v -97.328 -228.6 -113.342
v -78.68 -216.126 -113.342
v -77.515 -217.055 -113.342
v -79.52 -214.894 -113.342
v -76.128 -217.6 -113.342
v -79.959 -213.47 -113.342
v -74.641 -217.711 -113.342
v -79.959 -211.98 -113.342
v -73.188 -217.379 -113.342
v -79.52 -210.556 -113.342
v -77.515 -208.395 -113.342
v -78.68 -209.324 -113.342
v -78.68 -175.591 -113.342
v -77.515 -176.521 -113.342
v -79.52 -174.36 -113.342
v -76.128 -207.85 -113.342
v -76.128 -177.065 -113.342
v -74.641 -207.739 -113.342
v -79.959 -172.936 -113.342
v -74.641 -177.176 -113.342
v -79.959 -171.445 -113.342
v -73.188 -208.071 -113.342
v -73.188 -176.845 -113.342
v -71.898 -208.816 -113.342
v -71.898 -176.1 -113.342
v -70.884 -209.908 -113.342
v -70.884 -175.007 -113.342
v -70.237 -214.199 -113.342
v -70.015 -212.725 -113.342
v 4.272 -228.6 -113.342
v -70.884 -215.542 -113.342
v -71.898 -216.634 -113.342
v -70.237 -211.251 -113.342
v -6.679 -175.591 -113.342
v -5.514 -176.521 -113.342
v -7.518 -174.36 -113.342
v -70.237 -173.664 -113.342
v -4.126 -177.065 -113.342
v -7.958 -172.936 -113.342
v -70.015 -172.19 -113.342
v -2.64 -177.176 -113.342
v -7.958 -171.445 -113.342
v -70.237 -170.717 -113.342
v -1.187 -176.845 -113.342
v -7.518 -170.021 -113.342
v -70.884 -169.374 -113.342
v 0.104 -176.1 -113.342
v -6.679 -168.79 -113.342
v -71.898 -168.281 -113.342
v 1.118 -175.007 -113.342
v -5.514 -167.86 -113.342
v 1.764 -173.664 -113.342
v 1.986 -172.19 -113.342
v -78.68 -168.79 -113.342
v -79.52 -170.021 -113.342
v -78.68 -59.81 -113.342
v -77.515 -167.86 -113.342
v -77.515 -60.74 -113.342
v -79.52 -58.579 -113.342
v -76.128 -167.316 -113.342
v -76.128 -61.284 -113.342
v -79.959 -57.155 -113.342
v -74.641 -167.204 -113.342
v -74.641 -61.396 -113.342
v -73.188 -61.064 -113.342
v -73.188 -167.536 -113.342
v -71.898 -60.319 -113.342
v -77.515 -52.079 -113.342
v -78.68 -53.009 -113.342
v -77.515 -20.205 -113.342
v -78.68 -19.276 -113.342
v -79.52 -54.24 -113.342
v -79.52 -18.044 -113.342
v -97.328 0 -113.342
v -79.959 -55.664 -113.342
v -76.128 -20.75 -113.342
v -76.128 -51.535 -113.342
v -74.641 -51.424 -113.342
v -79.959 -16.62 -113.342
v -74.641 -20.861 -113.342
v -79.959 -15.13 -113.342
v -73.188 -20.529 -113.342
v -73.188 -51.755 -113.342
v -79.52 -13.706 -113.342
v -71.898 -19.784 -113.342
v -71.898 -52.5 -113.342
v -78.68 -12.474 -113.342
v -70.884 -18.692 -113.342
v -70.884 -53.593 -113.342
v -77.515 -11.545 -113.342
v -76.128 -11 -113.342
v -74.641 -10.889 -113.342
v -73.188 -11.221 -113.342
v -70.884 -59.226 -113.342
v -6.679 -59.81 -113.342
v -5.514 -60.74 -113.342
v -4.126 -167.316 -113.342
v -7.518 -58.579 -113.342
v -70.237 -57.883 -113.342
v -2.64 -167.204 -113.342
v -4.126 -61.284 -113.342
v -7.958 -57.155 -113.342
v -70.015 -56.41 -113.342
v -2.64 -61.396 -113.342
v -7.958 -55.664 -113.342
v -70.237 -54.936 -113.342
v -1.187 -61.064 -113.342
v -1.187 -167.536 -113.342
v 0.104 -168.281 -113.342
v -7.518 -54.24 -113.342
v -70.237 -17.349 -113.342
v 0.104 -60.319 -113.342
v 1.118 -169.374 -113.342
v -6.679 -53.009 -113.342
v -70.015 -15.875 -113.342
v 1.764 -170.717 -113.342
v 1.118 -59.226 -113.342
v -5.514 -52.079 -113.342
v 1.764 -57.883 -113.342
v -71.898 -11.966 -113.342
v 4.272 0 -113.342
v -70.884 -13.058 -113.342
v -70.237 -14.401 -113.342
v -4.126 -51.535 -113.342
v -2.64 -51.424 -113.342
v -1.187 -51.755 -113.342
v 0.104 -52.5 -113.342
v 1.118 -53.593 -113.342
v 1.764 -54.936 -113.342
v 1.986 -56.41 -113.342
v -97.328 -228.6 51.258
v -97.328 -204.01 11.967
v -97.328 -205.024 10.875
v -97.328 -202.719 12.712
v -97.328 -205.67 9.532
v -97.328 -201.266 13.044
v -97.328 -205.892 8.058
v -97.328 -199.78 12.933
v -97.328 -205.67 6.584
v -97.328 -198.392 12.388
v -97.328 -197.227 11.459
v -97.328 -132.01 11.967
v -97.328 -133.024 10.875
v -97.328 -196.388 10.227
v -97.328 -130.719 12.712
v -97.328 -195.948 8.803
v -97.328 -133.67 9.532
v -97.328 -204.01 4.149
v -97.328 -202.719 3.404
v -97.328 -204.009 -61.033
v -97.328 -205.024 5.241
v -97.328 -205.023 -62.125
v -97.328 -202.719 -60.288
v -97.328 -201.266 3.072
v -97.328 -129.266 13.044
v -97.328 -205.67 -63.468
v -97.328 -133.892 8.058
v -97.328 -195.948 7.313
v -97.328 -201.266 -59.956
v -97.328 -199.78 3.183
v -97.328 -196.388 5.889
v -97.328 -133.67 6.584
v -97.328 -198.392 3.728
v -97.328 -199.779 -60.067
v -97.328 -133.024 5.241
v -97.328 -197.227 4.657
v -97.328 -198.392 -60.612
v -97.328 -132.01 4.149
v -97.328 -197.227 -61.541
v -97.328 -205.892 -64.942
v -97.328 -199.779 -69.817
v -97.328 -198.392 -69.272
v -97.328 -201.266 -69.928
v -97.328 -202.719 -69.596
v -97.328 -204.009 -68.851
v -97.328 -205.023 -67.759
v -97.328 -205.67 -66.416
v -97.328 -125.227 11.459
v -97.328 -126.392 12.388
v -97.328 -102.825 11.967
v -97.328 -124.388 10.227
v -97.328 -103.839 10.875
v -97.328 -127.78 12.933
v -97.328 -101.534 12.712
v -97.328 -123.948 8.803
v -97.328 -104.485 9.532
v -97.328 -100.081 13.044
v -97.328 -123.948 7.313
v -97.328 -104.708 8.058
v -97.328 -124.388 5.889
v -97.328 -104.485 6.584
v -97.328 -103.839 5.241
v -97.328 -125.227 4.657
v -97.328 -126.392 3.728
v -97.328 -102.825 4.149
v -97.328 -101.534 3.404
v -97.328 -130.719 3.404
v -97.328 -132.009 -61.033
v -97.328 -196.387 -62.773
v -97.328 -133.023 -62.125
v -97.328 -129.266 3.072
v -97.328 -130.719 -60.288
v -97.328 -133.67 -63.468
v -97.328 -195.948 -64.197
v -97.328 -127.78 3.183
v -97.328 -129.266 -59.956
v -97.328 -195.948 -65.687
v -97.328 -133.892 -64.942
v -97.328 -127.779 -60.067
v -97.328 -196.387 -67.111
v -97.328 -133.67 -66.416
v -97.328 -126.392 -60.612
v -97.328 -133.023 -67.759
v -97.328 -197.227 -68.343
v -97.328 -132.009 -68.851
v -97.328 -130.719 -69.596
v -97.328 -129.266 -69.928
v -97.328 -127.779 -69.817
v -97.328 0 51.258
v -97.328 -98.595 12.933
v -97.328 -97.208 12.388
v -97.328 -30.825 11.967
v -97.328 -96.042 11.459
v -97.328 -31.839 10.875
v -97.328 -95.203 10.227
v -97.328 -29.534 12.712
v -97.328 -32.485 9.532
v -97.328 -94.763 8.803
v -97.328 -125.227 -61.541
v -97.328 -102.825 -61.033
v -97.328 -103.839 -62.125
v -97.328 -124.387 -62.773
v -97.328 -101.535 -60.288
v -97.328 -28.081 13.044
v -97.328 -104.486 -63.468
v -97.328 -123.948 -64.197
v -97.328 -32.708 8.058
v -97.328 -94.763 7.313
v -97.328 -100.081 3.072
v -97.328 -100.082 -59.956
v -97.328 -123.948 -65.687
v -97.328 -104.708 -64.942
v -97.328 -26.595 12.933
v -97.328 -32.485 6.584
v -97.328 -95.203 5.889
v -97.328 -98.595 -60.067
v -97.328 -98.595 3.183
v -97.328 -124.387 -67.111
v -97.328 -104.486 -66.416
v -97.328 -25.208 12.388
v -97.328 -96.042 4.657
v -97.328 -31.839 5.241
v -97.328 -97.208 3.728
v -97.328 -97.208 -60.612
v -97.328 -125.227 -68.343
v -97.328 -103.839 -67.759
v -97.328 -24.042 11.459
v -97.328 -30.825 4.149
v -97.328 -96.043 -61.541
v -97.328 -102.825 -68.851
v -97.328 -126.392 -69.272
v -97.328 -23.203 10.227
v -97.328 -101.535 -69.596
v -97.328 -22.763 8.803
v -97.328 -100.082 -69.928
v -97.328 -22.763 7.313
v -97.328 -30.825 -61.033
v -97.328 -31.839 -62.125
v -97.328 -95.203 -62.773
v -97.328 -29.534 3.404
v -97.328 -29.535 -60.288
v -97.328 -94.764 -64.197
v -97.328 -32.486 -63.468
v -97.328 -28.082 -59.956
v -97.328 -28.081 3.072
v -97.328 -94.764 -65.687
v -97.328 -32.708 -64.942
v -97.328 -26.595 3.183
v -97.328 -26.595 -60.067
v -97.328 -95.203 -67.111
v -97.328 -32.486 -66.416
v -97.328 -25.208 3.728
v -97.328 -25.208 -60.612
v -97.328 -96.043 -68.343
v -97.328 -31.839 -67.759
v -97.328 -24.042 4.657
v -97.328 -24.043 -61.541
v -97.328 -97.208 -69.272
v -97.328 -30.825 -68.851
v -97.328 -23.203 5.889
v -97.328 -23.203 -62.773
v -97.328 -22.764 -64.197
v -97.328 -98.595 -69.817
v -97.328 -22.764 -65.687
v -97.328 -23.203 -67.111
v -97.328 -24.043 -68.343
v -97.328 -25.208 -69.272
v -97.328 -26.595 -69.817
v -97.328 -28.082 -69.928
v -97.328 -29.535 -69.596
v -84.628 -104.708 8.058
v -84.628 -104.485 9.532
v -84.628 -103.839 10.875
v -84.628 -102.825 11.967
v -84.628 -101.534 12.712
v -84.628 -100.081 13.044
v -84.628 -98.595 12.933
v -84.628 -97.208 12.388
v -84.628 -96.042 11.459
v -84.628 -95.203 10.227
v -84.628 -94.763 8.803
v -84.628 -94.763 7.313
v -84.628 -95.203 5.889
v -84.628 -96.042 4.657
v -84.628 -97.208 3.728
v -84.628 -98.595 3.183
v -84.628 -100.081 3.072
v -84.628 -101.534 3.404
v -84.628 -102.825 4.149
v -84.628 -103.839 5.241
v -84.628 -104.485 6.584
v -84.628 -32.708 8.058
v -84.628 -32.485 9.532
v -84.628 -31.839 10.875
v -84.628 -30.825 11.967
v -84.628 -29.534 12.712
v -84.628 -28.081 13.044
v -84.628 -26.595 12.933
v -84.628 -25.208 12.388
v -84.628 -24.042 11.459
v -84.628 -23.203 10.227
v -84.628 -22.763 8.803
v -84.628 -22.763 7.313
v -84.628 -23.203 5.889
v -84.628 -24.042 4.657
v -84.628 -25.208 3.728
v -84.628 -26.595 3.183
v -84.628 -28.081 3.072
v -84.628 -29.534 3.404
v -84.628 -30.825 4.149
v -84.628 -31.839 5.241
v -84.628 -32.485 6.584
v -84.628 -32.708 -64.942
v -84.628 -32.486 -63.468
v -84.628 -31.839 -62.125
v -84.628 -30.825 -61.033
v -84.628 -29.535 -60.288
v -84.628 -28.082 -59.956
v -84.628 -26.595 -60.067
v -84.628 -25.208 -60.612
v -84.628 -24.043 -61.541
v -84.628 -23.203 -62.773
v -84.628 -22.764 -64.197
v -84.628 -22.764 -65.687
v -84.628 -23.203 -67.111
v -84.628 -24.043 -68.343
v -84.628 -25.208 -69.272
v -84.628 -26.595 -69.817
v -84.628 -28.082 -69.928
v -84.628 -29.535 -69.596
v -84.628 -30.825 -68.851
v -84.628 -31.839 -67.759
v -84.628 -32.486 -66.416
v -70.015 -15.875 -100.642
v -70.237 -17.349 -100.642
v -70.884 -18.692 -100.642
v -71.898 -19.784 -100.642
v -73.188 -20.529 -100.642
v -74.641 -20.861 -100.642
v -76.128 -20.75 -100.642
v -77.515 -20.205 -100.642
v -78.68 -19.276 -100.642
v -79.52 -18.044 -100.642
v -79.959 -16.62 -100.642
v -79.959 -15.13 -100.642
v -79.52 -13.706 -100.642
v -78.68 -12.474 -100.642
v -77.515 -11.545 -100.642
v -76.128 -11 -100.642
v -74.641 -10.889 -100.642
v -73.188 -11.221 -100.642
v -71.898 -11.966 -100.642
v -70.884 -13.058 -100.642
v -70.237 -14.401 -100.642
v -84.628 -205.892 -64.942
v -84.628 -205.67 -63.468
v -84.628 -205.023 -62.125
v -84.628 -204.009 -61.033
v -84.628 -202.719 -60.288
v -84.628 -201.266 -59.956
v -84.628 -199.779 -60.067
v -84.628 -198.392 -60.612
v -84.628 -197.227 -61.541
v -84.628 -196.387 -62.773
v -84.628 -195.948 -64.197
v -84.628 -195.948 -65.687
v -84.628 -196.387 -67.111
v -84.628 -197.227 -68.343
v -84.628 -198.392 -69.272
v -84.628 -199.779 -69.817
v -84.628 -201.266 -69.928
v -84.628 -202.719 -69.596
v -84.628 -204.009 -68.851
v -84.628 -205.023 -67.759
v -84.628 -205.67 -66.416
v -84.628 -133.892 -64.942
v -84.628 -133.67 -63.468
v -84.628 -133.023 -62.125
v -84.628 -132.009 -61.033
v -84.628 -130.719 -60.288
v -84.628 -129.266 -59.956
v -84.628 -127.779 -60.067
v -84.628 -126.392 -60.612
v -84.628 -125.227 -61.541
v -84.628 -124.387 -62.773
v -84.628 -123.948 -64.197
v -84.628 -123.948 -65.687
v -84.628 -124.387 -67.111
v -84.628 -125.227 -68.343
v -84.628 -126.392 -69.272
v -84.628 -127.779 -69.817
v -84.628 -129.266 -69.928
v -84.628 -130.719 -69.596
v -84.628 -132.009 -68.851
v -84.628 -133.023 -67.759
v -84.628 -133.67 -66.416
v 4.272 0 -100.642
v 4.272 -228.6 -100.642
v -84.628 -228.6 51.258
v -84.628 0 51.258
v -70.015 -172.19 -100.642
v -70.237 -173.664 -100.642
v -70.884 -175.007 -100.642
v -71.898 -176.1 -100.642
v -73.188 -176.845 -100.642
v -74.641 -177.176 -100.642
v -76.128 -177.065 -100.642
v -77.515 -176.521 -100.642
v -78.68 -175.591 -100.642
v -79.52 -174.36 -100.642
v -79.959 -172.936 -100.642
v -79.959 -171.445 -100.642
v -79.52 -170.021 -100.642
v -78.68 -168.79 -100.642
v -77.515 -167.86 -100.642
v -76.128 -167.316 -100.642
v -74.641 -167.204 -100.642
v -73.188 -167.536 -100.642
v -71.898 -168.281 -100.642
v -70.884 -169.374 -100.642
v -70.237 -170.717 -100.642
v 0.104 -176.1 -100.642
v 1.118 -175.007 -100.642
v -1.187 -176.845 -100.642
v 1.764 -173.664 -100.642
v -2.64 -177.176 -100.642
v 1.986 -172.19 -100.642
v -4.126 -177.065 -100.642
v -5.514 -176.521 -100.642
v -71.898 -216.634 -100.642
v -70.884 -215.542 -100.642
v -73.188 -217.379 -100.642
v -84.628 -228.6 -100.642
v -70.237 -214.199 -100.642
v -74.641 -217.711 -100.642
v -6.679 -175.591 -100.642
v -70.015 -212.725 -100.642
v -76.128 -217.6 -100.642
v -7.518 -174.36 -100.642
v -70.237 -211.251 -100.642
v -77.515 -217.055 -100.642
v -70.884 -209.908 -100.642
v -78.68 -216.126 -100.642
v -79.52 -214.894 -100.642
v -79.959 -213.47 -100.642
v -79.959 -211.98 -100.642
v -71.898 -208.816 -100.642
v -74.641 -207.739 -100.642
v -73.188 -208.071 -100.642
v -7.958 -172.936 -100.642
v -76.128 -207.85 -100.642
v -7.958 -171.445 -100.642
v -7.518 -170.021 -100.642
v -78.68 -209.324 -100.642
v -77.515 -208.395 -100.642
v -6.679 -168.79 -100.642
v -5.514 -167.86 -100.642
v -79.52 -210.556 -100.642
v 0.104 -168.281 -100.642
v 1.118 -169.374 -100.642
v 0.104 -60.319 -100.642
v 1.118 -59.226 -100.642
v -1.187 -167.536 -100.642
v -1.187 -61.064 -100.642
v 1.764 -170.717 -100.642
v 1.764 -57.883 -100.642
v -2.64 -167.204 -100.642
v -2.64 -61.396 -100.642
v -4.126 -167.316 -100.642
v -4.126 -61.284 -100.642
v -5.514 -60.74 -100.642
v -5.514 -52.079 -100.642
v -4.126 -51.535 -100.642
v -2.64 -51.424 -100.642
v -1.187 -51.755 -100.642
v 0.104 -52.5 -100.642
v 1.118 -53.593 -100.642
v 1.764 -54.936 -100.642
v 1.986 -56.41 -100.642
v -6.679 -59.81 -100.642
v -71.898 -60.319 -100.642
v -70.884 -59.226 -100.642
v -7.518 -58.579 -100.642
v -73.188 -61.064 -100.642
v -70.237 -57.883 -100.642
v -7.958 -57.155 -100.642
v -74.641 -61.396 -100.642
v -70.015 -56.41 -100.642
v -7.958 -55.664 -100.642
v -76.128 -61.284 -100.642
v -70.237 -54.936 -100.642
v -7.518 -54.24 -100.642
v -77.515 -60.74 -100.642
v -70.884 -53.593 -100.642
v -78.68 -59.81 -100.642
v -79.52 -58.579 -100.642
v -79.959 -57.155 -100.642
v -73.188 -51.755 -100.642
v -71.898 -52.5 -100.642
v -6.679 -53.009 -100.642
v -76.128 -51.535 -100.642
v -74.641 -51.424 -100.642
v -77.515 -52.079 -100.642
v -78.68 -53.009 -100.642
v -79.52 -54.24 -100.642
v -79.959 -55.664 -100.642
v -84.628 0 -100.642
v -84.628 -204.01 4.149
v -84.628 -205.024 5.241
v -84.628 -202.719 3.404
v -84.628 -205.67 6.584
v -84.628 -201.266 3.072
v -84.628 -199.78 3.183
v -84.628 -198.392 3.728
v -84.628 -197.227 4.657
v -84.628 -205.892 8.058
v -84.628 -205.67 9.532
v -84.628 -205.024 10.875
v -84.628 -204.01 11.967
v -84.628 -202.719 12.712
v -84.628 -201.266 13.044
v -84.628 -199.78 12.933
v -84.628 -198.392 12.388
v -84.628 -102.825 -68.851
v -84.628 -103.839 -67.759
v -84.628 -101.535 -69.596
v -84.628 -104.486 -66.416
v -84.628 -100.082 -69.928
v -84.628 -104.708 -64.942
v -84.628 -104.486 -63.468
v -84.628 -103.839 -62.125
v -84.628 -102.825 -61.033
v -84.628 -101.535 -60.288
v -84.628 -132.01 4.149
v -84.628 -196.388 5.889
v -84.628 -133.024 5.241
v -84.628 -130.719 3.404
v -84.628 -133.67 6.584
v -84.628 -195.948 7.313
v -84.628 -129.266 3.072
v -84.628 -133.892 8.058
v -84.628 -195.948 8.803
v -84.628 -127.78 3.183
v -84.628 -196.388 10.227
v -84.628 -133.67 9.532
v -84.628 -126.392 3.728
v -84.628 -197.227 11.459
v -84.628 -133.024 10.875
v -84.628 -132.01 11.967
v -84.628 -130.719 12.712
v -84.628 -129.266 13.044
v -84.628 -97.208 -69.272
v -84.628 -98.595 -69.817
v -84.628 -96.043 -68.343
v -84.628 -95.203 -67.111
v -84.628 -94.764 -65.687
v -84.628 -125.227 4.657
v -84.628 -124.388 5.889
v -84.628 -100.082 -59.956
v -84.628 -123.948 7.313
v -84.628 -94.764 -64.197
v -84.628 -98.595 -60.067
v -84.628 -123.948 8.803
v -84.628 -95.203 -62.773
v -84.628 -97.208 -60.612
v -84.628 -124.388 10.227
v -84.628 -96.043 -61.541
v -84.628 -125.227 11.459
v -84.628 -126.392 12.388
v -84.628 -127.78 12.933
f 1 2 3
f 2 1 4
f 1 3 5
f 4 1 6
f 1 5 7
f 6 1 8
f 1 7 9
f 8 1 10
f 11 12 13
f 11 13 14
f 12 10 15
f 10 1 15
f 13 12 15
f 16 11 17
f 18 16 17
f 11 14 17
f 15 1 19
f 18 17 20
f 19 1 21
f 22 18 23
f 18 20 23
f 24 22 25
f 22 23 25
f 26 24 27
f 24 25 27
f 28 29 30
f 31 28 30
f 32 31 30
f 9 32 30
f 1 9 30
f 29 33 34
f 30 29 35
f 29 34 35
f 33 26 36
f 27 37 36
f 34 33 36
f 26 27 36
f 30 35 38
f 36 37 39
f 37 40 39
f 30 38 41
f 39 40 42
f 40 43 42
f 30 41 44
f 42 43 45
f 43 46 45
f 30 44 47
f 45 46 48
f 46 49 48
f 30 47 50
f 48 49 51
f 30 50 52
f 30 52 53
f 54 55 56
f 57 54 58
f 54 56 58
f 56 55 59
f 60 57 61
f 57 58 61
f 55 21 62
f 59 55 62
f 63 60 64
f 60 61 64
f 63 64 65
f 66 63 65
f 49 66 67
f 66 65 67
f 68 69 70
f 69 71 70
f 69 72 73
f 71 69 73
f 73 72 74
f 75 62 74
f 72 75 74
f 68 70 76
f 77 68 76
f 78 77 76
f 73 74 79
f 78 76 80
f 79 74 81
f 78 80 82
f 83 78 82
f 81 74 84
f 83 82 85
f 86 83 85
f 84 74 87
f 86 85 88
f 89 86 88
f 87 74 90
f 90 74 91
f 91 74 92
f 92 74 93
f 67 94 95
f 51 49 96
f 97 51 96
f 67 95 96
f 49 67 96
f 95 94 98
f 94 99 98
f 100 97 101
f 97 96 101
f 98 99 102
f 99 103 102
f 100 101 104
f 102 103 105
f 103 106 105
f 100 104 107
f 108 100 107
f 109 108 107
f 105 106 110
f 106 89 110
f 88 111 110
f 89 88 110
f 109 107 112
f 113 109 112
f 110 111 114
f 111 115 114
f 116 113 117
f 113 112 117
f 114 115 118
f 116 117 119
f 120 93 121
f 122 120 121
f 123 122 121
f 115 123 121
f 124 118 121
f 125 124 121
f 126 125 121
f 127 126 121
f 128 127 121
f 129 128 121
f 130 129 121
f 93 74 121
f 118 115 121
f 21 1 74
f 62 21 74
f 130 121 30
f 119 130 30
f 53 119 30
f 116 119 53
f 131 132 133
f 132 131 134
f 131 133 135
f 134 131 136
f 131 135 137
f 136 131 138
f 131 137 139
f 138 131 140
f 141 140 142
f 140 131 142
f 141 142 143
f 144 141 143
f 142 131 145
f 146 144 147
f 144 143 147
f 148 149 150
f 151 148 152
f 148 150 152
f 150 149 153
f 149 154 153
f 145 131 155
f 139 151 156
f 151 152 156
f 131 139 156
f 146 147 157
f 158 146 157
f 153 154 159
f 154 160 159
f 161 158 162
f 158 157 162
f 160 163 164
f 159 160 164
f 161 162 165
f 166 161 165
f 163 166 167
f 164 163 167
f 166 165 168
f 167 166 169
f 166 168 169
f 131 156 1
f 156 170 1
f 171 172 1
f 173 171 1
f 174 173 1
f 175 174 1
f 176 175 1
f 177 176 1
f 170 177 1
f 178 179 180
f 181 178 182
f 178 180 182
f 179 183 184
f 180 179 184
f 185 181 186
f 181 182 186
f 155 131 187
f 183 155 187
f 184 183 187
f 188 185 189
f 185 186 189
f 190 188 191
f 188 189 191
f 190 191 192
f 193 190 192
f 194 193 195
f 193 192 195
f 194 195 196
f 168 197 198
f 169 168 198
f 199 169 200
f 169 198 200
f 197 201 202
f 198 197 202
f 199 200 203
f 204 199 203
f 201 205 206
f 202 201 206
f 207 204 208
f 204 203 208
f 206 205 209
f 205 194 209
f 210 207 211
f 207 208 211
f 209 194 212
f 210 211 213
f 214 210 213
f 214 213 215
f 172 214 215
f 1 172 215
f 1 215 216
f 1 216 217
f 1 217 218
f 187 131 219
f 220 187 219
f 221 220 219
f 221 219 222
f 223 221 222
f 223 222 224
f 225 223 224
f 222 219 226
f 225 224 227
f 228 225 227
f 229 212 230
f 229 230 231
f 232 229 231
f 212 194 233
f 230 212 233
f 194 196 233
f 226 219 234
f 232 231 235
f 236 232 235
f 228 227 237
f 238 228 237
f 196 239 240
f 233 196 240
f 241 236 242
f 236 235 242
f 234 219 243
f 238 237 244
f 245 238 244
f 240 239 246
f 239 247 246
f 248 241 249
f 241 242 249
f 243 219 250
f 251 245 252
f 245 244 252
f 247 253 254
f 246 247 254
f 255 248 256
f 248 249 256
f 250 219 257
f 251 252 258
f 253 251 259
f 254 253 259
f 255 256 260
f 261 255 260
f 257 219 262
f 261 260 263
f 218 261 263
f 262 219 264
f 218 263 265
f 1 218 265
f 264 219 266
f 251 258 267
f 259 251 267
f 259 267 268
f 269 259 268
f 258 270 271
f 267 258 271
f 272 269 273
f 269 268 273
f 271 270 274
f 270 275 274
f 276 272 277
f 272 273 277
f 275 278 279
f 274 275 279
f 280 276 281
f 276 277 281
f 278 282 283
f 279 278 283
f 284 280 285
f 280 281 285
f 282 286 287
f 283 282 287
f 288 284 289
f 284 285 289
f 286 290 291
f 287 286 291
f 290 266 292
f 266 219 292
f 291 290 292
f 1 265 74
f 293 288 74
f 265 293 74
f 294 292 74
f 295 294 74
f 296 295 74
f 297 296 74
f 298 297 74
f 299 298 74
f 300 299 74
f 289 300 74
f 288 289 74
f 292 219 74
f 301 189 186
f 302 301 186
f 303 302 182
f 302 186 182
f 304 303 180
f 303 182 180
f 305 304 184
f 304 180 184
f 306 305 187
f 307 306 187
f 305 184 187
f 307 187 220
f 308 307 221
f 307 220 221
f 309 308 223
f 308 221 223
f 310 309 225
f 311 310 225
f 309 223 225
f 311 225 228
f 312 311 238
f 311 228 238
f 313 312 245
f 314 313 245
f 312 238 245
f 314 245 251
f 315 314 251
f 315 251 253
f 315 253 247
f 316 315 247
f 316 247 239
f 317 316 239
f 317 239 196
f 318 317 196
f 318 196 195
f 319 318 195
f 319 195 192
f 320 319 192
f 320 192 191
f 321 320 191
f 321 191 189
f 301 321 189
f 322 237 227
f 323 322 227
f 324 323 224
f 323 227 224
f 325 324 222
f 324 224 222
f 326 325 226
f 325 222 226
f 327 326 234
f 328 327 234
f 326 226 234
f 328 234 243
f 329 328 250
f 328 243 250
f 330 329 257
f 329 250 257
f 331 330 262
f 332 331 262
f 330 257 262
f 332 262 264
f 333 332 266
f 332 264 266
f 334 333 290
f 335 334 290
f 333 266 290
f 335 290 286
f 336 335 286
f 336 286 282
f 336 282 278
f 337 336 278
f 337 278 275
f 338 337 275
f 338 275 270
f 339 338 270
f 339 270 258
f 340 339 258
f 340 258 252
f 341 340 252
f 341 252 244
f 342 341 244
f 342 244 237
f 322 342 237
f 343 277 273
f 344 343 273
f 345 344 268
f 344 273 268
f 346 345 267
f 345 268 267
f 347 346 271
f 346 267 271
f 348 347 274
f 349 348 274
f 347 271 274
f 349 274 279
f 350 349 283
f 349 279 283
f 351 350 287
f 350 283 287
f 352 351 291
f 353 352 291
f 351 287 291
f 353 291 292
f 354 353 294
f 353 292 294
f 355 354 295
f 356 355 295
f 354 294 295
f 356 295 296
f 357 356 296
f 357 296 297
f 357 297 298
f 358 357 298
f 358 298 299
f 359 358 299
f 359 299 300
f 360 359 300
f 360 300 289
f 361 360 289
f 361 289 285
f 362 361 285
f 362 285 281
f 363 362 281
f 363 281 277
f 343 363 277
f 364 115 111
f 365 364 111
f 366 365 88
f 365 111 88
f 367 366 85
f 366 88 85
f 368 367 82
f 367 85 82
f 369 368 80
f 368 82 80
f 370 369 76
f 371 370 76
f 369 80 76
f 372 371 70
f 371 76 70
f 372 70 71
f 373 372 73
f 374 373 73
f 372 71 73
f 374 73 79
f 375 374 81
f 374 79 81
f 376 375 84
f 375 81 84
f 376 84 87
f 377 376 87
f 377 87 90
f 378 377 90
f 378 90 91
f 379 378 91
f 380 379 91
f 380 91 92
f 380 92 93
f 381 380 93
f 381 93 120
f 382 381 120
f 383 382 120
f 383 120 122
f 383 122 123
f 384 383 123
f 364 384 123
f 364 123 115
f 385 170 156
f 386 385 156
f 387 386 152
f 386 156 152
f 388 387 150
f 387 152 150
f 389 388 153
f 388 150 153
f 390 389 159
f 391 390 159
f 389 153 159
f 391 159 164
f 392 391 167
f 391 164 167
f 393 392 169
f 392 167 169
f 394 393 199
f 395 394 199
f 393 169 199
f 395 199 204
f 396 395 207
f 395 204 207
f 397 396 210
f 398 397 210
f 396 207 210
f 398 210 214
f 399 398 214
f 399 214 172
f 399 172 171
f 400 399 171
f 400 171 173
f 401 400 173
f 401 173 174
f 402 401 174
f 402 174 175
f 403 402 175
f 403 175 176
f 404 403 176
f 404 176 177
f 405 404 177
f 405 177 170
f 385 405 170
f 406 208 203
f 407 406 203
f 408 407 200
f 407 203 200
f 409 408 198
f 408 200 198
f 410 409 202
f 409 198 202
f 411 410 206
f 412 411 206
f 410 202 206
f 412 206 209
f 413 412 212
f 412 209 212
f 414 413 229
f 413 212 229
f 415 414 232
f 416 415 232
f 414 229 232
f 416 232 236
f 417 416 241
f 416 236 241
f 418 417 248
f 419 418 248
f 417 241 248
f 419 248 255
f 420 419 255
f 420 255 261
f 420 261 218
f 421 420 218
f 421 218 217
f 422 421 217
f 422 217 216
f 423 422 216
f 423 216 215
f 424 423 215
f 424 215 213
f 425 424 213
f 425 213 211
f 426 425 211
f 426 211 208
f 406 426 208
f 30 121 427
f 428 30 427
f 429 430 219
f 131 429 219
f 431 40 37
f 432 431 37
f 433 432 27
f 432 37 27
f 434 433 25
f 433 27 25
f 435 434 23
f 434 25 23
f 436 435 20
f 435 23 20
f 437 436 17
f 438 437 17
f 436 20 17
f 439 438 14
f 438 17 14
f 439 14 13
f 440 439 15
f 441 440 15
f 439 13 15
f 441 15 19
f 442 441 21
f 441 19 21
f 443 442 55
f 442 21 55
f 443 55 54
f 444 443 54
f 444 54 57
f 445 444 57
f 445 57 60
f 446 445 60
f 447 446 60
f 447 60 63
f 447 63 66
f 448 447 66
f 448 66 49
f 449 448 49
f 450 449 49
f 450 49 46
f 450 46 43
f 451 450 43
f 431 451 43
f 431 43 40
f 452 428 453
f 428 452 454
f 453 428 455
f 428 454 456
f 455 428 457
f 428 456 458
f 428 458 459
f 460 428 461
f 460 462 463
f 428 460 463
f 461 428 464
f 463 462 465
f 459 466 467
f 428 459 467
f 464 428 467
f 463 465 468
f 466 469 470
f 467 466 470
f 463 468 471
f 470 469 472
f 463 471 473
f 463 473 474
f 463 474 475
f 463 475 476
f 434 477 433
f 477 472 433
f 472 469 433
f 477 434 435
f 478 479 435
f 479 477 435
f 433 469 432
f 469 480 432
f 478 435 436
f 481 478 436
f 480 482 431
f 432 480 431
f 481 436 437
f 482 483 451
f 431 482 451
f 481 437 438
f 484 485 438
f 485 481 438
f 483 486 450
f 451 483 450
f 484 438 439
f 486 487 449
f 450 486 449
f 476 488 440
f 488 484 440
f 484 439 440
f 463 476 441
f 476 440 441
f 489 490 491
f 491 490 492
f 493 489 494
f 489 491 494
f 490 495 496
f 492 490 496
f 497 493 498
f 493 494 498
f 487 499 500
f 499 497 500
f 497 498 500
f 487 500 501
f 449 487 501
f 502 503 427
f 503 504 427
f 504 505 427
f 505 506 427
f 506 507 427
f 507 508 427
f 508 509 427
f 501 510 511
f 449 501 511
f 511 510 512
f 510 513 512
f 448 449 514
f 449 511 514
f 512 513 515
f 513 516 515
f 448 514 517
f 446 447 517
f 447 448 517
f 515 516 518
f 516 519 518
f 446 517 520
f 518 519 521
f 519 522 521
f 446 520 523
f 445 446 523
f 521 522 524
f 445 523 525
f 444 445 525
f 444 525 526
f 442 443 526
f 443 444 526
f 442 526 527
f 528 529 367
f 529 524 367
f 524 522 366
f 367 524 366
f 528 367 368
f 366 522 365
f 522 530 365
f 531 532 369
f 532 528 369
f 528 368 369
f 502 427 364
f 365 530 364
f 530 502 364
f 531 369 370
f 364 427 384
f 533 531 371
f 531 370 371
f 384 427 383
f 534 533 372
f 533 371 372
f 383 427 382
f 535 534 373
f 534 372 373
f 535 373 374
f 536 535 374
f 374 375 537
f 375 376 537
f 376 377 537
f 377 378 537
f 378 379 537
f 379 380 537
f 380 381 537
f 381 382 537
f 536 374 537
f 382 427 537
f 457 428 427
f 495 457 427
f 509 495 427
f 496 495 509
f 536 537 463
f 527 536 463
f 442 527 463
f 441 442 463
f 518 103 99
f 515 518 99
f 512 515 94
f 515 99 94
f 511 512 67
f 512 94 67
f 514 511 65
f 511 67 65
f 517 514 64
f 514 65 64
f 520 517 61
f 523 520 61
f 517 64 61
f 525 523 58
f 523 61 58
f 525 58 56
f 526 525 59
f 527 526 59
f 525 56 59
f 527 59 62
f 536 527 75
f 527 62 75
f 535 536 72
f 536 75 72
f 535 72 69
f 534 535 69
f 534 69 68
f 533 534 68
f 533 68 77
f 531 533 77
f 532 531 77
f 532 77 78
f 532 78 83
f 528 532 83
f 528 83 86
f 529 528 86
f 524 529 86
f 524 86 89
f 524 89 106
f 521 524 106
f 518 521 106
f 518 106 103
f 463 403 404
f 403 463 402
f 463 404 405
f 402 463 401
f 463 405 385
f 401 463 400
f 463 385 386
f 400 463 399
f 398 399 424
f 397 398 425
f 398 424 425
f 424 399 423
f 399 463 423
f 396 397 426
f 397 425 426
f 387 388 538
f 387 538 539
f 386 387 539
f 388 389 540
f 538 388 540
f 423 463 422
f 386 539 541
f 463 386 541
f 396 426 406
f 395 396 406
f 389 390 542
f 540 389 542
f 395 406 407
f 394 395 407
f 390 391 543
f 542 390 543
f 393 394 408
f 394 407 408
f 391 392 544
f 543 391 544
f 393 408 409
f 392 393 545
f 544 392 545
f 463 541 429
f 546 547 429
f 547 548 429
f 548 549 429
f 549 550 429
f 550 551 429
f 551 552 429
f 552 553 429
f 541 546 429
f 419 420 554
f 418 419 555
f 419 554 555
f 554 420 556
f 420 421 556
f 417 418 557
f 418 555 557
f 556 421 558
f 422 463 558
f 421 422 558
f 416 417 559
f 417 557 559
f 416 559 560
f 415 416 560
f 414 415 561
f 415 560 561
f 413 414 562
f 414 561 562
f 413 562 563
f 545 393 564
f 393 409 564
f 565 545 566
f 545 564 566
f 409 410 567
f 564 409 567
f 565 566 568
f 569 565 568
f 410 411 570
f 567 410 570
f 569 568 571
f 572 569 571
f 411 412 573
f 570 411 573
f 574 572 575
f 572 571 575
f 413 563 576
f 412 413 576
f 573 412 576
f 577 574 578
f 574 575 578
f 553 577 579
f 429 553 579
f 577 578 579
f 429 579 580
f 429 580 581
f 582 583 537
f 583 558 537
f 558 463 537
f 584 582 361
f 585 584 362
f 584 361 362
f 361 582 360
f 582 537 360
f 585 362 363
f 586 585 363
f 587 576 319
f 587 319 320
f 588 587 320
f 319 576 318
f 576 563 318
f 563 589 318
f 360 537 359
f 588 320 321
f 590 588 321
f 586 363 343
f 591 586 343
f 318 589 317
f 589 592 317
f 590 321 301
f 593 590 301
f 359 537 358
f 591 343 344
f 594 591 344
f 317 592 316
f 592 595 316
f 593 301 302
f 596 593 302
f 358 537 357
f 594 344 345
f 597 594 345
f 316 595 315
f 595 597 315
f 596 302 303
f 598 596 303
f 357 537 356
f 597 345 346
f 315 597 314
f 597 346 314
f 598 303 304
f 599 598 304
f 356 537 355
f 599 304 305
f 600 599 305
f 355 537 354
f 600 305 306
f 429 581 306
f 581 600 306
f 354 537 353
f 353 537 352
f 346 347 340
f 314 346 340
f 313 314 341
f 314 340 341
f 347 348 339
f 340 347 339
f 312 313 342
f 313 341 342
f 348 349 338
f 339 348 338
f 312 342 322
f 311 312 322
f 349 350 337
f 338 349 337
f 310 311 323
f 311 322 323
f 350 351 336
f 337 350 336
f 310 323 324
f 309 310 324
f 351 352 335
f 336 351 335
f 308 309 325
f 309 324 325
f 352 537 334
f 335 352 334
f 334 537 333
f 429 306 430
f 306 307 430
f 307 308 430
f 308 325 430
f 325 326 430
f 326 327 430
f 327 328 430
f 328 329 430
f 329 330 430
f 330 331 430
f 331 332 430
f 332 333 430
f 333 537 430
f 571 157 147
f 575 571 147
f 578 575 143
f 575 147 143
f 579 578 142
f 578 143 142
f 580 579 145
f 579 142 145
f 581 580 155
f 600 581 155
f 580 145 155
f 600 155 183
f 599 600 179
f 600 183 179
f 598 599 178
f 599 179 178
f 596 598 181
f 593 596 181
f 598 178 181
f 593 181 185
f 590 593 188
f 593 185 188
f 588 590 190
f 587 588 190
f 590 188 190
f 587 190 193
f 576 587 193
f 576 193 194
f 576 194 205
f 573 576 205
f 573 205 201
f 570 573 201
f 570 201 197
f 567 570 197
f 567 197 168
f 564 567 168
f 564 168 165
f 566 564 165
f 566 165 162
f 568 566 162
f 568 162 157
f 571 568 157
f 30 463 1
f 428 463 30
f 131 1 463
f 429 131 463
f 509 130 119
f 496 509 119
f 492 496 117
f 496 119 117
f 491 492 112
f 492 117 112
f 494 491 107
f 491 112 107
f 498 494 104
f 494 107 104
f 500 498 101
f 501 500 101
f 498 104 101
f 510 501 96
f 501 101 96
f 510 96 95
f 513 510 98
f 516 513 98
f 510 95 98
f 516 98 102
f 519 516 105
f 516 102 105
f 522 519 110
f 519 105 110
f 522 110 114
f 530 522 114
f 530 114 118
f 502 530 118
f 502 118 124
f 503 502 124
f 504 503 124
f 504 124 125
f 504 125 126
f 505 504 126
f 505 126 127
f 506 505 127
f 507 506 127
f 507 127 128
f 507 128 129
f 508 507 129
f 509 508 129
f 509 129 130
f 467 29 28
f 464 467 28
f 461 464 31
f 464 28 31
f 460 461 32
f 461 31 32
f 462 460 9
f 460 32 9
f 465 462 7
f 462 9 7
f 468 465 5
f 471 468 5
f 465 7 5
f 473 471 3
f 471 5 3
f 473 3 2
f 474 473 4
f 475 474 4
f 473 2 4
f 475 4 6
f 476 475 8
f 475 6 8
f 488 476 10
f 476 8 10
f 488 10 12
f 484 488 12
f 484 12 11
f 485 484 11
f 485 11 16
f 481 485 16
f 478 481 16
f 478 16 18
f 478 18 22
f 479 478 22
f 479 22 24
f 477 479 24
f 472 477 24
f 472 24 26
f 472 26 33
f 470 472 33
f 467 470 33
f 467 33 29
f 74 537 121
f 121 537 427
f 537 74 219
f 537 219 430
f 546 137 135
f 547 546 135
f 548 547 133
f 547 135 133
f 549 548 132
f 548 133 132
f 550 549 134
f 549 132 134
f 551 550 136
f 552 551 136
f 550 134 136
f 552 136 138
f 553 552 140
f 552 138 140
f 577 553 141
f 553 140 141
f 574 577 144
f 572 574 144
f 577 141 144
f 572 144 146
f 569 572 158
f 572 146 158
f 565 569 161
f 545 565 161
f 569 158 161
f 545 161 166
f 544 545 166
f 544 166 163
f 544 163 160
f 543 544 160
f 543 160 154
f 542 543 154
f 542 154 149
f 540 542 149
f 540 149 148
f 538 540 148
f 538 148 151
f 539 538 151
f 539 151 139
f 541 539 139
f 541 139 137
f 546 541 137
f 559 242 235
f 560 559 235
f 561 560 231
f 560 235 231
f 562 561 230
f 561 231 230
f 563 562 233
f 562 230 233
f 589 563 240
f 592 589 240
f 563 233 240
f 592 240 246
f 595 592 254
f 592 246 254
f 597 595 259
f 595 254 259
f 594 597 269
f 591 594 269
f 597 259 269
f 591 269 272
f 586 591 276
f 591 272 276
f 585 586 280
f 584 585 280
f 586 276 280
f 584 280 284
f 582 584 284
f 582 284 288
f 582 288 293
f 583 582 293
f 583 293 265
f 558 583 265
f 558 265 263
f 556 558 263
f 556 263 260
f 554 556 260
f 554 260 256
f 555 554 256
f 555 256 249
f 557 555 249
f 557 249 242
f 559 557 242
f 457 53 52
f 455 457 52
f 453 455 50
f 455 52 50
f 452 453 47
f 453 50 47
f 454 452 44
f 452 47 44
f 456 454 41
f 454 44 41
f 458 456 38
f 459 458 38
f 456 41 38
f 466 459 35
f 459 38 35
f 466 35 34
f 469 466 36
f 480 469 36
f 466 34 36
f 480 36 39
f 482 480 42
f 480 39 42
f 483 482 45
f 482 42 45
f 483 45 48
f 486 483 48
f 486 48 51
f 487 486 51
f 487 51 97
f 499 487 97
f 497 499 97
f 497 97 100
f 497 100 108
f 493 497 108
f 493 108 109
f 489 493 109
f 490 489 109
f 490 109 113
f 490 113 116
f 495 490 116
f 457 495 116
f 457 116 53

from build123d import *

# Parameters (mm, degrees)
F1_DEPTH = 228.6
F2_R     = 5
F3_DEPTH = 25
F4_R     = 5
F5_DEPTH = 101.601


with BuildPart() as f1:
    # F0 (on Front) → F1 (new body)
    with BuildSketch(Plane.XZ):
        Polygon((-84.627599, 51.257959), (-97.327599, 51.257959), (-97.327599, -113.342041), (4.272401, -113.342041), (4.272401, -100.642041), (-84.627599, -100.642041), align=None)
    extrude(amount=F1_DEPTH)

    # F2 (on face) → F3 (cut)
    with BuildSketch(Plane(origin=(0, 0, -113.342041), x_dir=(1, 0, 0), z_dir=(0, 0, -1))):
        with Locations((-3.013599, 172.19039)):
            Circle(F2_R)
        with Locations((-3.013599, 56.40959)):
            Circle(F2_R)
        with Locations((-75.014999, 172.19039)):
            Circle(F2_R)
        with Locations((-75.014999, 56.40959)):
            Circle(F2_R)
        with Locations((-75.014999, 15.875)):
            Circle(F2_R)
        with Locations((-75.014999, 212.725)):
            Circle(F2_R)
    extrude(amount=-F3_DEPTH, mode=Mode.SUBTRACT)

    # F4 (on face) → F5 (cut, through all)
    with BuildSketch(Plane(origin=(-97.327599, 0, 0), x_dir=(0, -1, 0), z_dir=(-1, 0, 0))):
        with Locations((200.8924, 8.057959)):
            Circle(F4_R)
        with Locations((128.8924, 8.057959)):
            Circle(F4_R)
        with Locations((99.7076, 8.057959)):
            Circle(F4_R)
        with Locations((27.7076, 8.057959)):
            Circle(F4_R)
        with Locations((27.708, -64.942041)):
            Circle(F4_R)
        with Locations((99.708, -64.942041)):
            Circle(F4_R)
        with Locations((128.892, -64.942041)):
            Circle(F4_R)
        with Locations((200.892, -64.942041)):
            Circle(F4_R)
    extrude(amount=-F5_DEPTH, mode=Mode.SUBTRACT)


solid = f1.part
